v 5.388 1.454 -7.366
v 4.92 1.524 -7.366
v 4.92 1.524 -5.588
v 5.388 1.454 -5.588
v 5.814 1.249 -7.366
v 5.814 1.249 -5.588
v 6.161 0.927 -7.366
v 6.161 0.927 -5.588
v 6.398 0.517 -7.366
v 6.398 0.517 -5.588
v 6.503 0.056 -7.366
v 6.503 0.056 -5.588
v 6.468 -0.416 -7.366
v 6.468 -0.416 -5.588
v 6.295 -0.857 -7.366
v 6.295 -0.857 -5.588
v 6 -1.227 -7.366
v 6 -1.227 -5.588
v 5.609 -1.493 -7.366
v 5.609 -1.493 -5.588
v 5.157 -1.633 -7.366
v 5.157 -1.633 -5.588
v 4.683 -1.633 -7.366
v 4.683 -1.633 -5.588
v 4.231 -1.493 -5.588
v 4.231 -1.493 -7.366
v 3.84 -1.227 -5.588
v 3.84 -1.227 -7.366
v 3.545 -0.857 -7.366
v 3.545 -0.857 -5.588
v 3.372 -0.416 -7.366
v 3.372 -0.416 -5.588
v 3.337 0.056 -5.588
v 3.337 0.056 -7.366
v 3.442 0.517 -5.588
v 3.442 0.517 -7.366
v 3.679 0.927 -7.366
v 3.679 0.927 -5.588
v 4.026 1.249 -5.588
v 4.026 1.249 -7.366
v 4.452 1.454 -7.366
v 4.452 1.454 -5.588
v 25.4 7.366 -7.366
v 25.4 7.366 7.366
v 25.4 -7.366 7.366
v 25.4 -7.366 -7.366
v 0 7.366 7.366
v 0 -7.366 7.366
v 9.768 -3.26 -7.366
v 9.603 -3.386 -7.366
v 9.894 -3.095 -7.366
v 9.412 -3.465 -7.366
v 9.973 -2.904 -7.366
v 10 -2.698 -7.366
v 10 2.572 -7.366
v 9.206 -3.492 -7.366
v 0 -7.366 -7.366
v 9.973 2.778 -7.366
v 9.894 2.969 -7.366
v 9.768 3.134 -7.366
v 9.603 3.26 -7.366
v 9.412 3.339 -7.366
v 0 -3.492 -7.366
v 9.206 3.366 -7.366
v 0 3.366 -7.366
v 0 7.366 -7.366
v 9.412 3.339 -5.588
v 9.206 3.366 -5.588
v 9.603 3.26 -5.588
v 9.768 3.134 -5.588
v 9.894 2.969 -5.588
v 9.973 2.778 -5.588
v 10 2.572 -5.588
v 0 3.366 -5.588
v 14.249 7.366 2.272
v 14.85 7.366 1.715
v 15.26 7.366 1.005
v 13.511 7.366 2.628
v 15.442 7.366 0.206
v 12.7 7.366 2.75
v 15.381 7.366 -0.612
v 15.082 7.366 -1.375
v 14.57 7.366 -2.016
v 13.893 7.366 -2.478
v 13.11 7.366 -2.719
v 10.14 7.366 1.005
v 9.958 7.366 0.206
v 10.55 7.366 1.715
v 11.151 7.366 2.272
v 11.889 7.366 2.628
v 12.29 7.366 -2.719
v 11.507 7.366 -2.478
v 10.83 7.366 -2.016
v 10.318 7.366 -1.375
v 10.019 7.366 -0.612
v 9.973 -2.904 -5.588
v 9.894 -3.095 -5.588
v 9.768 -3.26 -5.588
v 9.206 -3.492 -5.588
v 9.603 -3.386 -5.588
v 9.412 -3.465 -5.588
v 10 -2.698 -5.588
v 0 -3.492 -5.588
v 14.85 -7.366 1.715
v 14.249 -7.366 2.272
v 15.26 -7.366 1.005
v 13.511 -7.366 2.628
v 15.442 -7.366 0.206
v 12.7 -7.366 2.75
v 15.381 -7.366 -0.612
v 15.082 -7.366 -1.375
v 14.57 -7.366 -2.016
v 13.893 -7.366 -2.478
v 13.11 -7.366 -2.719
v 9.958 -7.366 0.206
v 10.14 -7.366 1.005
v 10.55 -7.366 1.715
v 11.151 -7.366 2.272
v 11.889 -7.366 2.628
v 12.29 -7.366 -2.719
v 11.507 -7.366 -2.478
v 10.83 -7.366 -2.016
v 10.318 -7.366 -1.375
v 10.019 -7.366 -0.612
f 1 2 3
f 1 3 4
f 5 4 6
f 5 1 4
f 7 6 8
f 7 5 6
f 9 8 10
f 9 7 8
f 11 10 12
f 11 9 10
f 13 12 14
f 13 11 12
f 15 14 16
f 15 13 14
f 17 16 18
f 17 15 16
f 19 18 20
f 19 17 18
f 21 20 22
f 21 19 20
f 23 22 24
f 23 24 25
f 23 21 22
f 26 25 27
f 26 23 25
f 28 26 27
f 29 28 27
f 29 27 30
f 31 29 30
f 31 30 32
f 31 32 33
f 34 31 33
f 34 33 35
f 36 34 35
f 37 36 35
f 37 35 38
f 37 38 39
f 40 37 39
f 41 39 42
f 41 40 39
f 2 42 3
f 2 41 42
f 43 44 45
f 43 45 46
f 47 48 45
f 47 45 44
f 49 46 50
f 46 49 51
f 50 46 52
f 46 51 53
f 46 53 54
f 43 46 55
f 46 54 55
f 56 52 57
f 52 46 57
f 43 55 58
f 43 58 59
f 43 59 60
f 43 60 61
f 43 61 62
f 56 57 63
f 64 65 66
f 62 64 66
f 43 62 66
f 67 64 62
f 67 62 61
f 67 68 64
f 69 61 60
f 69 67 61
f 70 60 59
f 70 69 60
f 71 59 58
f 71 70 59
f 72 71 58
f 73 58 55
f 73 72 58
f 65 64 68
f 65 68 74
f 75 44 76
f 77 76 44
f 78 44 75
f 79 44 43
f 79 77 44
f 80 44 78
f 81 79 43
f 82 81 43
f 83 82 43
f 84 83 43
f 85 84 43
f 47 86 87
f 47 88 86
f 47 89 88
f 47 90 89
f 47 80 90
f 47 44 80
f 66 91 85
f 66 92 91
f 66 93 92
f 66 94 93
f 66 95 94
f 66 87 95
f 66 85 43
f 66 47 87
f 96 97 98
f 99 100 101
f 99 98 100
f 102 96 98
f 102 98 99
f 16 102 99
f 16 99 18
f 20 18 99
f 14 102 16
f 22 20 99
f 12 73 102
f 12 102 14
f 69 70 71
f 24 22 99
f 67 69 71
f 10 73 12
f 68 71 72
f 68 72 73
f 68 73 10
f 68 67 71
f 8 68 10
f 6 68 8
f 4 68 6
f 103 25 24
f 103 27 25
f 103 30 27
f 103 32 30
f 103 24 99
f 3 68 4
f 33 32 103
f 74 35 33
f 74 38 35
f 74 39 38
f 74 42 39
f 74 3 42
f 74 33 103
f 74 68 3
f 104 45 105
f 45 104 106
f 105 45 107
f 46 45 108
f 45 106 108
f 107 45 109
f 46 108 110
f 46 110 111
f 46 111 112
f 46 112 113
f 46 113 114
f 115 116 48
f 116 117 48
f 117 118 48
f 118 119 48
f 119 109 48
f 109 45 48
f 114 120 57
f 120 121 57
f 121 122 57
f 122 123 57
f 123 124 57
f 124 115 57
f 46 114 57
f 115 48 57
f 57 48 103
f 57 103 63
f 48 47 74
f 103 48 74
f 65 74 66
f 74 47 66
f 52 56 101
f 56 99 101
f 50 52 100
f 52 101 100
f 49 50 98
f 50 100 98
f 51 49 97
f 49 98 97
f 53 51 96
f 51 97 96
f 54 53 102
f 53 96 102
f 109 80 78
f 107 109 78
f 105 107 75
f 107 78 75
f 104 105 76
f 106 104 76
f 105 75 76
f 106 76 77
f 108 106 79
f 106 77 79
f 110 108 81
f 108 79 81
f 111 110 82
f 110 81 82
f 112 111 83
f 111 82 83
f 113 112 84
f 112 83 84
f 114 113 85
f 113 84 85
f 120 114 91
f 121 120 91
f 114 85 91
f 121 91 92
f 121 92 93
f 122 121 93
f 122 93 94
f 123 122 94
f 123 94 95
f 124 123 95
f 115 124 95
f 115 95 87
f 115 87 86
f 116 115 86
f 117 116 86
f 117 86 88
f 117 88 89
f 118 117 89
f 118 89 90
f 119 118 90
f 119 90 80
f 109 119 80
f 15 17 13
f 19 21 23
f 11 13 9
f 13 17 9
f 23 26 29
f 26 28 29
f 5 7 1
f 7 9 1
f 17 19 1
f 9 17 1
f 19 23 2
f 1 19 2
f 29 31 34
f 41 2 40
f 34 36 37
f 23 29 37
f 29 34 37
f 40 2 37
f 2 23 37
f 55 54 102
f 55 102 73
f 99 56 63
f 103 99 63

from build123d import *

# Parameters (mm, degrees)
SKETCH1_W           = 14.732
SKETCH1_H           = 14.732
BOSS_EXTRUDE1_DEPTH = 25.4
SKETCH2_R           = 2.75
CUT_EXTRUDE1_DEPTH  = 31.272921564
SKETCH3_W           = 10
SKETCH3_H           = 6.858
SKETCH3_R           = 1.5875
CUT_EXTRUDE2_DEPTH  = 1.778
FILLET1_R           = 0.79375


with BuildPart() as part:
    # Sketch1 → Boss-Extrude1 (new body)
    with BuildSketch(Plane(origin=(0, 0, 0), x_dir=(0, 0, -1), z_dir=(1, 0, 0))):
        Rectangle(SKETCH1_W, SKETCH1_H)
    extrude(amount=BOSS_EXTRUDE1_DEPTH)

    # Sketch2 → Cut-Extrude1 (cut, through all)
    with BuildSketch(Plane(origin=(0, 7.366, 0), x_dir=(1, 0, 0), z_dir=(0, 1, 0))):
        with Locations(Location((12.7, 0, 0), (0, 0, 270))):
            Circle(SKETCH2_R)
    extrude(amount=-CUT_EXTRUDE1_DEPTH, mode=Mode.SUBTRACT)

    # Sketch3 → Cut-Extrude2 (cut)
    with BuildSketch(Plane(origin=(0, 0, -7.366), x_dir=(-1, 0, 0), z_dir=(0, 0, -1))):
        with Locations((-5, -0.063)):
            Rectangle(SKETCH3_W, SKETCH3_H)
        with Locations(Location((-4.92, -0.063, 0), (0, 0, 90))):
            Circle(SKETCH3_R, mode=Mode.SUBTRACT)
    extrude(amount=-CUT_EXTRUDE2_DEPTH, mode=Mode.SUBTRACT)

    # Fillet1
    fillet1_edges = [part.edges().sort_by_distance(p)[0] for p in [
        (10, -3.492, -6.477),
        (10, 3.366, -6.477),
    ]]
    fillet(fillet1_edges, radius=FILLET1_R)


solid = part.part
